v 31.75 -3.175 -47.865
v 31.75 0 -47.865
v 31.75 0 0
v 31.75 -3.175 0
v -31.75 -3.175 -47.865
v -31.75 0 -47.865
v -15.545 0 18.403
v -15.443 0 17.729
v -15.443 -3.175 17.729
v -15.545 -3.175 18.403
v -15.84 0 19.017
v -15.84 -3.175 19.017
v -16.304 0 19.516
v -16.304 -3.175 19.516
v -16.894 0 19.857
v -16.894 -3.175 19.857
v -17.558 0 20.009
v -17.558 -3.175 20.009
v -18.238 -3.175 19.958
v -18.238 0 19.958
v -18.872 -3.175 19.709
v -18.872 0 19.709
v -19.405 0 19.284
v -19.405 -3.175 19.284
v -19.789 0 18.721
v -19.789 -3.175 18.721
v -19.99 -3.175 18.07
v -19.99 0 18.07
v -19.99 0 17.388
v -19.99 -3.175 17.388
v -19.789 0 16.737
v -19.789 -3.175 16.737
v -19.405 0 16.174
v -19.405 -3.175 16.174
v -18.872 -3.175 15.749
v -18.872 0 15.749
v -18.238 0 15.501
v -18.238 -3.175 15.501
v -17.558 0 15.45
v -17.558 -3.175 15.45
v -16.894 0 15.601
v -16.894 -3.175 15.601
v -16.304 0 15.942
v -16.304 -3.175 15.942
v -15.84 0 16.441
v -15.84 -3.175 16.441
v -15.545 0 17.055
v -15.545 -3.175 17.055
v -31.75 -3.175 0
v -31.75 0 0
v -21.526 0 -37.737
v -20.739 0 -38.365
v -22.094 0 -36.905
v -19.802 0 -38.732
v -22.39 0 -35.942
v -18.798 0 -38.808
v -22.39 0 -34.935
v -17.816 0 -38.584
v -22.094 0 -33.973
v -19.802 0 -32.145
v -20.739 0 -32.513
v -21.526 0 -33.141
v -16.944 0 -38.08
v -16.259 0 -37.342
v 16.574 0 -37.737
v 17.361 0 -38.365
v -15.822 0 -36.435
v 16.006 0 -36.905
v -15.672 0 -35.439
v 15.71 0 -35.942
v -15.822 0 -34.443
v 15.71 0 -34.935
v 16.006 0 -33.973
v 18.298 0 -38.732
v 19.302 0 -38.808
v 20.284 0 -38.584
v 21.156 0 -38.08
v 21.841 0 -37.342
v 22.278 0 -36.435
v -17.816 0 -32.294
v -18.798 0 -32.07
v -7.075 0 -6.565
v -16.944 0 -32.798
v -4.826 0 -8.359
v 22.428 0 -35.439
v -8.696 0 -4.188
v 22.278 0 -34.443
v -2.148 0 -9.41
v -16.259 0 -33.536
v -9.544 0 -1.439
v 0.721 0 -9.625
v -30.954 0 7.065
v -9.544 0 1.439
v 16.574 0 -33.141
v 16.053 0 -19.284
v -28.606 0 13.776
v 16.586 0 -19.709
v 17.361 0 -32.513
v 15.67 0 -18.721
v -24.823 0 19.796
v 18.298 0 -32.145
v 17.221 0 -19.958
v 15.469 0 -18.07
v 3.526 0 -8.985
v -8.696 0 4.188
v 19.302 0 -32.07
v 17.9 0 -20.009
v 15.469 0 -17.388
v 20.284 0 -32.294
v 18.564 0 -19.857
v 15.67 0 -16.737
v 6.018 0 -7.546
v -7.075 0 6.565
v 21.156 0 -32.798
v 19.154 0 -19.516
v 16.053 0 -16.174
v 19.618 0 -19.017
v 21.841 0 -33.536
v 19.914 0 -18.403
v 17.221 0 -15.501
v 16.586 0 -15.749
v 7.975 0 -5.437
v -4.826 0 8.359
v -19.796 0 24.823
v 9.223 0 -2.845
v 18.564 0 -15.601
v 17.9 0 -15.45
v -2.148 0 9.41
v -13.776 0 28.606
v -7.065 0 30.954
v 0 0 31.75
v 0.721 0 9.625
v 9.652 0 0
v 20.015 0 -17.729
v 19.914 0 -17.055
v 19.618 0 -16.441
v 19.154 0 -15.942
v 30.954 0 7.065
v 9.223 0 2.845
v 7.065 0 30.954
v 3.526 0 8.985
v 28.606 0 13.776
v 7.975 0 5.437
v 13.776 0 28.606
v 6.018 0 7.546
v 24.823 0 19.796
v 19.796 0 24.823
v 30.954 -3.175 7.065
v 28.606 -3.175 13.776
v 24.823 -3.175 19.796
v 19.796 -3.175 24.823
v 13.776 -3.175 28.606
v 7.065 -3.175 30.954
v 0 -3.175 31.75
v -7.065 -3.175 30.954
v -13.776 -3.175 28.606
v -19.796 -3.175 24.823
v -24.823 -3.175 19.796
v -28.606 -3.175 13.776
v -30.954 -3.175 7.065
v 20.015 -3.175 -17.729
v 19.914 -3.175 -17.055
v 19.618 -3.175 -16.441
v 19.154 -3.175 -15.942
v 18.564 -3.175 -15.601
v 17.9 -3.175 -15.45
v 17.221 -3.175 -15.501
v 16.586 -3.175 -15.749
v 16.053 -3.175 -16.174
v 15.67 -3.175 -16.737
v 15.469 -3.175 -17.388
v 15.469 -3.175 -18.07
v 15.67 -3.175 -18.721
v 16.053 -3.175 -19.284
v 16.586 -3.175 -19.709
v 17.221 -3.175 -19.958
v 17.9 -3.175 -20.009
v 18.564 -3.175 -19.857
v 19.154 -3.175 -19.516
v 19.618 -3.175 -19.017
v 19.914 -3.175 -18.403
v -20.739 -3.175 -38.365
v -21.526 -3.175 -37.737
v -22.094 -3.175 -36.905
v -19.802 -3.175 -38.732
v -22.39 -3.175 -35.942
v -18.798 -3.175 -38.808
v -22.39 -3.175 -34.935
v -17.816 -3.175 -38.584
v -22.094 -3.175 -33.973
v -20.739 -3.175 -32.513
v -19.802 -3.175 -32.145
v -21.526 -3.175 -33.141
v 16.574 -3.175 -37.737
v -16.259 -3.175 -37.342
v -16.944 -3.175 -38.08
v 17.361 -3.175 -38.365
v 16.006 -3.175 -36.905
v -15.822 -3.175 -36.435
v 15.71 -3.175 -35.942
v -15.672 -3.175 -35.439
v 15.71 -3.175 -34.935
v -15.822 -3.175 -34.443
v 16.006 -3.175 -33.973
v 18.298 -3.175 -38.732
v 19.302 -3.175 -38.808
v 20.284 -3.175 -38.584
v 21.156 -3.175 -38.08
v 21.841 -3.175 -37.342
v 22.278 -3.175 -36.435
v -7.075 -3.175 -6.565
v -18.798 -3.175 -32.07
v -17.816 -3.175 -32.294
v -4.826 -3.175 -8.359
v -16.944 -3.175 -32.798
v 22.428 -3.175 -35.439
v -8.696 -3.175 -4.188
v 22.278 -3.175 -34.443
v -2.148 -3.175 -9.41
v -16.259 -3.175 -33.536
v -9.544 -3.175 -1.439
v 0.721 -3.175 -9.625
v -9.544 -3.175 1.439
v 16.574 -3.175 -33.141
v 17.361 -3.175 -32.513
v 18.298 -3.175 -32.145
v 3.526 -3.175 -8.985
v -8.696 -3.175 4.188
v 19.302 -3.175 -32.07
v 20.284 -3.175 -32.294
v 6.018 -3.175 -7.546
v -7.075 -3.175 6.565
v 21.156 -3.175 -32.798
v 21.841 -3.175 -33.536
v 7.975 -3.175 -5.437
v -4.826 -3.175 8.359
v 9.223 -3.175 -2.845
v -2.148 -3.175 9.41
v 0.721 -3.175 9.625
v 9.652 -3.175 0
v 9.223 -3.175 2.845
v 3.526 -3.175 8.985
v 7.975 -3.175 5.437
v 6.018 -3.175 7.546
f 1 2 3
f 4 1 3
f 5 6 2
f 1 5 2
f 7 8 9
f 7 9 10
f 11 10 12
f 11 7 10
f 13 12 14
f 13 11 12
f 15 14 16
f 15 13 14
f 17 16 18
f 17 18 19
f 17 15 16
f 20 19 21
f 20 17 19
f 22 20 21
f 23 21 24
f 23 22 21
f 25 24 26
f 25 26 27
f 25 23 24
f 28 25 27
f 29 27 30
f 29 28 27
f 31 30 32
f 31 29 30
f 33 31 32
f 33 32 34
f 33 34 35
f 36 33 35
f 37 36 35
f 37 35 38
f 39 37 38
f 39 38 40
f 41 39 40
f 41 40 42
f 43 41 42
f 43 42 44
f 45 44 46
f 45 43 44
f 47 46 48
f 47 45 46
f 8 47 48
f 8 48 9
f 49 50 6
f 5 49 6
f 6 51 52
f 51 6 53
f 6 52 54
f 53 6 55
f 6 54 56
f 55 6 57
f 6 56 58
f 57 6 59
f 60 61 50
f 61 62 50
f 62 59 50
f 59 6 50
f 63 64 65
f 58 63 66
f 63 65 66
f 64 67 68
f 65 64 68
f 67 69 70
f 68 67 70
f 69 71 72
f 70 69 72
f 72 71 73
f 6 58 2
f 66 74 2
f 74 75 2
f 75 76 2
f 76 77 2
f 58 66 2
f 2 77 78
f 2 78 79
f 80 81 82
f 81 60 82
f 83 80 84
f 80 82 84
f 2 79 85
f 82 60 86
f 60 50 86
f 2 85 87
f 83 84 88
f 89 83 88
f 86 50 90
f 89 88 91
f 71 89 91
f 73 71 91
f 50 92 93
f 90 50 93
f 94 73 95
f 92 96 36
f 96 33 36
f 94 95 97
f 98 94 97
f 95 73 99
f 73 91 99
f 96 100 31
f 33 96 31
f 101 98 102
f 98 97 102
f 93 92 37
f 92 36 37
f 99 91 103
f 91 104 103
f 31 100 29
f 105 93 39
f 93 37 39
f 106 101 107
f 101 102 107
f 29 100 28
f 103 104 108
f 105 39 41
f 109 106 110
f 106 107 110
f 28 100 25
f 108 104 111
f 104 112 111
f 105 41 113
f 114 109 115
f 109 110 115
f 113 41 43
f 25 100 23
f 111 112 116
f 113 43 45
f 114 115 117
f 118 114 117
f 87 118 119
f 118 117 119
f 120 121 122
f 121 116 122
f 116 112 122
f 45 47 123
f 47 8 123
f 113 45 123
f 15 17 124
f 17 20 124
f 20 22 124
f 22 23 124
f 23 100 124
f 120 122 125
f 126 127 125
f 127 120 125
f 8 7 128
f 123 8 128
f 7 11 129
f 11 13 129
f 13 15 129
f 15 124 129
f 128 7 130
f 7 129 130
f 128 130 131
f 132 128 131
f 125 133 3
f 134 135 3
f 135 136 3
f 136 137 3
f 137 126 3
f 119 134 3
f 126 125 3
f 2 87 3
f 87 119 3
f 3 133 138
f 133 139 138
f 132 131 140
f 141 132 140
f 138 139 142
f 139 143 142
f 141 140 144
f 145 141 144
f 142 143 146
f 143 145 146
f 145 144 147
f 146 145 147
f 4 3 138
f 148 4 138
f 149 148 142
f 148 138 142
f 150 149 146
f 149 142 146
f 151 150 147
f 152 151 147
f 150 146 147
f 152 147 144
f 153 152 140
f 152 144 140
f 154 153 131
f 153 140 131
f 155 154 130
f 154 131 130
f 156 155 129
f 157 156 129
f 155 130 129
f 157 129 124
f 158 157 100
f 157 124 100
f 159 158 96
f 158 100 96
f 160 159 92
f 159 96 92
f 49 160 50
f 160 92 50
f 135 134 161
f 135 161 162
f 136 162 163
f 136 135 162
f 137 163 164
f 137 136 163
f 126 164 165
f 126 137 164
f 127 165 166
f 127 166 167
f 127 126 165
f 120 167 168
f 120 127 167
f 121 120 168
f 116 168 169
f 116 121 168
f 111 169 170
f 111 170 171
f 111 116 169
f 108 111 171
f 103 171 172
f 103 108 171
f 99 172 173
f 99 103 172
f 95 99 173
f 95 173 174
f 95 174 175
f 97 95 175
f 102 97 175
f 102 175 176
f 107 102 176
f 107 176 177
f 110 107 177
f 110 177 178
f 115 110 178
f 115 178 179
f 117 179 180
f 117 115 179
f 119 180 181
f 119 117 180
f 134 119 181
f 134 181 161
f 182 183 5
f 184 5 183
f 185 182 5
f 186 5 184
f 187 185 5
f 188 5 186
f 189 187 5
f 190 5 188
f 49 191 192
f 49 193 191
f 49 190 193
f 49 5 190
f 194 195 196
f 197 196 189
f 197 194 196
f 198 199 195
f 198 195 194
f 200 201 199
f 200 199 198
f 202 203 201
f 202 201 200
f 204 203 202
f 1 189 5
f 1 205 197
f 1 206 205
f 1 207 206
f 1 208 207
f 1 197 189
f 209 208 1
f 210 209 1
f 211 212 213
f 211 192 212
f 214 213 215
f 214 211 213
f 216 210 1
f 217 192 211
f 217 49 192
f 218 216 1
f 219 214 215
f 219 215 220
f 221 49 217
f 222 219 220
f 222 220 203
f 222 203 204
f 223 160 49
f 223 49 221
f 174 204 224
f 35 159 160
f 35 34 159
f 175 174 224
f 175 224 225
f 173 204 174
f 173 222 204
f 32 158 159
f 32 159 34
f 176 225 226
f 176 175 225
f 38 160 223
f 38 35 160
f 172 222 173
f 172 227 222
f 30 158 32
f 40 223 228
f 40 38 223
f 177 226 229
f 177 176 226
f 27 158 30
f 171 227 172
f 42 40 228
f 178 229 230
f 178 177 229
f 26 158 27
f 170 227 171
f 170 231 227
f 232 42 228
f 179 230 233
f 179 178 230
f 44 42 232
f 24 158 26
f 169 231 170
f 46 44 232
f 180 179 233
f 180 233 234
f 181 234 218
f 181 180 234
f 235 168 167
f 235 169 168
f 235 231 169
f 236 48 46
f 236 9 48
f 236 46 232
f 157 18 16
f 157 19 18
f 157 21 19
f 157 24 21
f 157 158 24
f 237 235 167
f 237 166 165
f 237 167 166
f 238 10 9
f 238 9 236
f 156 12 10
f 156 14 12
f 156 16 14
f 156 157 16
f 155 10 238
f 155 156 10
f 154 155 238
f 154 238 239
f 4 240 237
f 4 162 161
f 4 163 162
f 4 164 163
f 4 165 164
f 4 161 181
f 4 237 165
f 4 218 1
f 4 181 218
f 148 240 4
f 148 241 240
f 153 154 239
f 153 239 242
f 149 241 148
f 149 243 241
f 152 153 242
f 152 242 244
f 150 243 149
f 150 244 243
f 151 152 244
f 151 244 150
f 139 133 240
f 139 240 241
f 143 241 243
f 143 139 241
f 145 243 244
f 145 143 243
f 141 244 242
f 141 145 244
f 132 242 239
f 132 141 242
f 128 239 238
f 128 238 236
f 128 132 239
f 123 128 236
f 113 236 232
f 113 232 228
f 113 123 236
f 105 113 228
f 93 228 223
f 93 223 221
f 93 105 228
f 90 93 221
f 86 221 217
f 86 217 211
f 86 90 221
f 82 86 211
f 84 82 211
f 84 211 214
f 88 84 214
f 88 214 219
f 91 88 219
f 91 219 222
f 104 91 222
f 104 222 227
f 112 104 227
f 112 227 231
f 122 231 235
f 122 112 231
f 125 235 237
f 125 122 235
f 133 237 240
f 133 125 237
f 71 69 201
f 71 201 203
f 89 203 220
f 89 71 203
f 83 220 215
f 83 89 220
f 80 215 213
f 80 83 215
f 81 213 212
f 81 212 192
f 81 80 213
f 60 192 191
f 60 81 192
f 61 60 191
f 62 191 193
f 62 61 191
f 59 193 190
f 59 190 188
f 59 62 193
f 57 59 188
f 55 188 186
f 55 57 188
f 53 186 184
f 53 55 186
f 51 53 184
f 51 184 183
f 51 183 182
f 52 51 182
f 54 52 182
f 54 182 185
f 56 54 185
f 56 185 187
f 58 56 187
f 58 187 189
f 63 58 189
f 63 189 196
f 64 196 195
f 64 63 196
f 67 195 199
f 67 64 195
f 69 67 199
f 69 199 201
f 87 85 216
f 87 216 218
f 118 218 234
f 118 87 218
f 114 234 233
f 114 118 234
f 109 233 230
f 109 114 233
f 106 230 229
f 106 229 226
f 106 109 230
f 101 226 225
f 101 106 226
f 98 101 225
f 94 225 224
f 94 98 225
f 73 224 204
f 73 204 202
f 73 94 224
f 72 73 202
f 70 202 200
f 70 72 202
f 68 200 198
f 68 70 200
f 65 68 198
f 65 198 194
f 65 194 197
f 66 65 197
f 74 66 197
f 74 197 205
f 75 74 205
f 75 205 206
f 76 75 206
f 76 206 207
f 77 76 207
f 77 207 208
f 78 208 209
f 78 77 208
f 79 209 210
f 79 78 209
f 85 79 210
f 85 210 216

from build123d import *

# Parameters (mm, degrees)
F0_R     = 3.3782
F0_R_2   = 2.286
F0_R_3   = 9.652
F1_DEPTH = 3.175


with BuildPart() as f1:
    # F0 (on Front) → F1 (new body)
    with BuildSketch(Plane.XZ):
        with BuildLine():
            Line((31.75, -15.634657), (31.75, 0))
            ThreePointArc((31.75, 0), (0, 31.75), (-31.75, 0))
            Line((-31.75, 0), (-31.75, -15.634657))
            Line((-31.75, -15.634657), (-31.75, -47.865343))
            Line((-31.75, -47.865343), (31.75, -47.865343))
            Line((31.75, -47.865343), (31.75, -15.634657))
        make_face()
        with Locations((-19.05, -35.438904)):
            Circle(F0_R, mode=Mode.SUBTRACT)
        with Locations((19.05, -35.438904)):
            Circle(F0_R, mode=Mode.SUBTRACT)
        with Locations((17.7292, -17.7292)):
            Circle(F0_R_2, mode=Mode.SUBTRACT)
        with Locations((-17.7292, 17.7292)):
            Circle(F0_R_2, mode=Mode.SUBTRACT)
        Circle(F0_R_3, mode=Mode.SUBTRACT)
    extrude(amount=F1_DEPTH)


solid = f1.part
